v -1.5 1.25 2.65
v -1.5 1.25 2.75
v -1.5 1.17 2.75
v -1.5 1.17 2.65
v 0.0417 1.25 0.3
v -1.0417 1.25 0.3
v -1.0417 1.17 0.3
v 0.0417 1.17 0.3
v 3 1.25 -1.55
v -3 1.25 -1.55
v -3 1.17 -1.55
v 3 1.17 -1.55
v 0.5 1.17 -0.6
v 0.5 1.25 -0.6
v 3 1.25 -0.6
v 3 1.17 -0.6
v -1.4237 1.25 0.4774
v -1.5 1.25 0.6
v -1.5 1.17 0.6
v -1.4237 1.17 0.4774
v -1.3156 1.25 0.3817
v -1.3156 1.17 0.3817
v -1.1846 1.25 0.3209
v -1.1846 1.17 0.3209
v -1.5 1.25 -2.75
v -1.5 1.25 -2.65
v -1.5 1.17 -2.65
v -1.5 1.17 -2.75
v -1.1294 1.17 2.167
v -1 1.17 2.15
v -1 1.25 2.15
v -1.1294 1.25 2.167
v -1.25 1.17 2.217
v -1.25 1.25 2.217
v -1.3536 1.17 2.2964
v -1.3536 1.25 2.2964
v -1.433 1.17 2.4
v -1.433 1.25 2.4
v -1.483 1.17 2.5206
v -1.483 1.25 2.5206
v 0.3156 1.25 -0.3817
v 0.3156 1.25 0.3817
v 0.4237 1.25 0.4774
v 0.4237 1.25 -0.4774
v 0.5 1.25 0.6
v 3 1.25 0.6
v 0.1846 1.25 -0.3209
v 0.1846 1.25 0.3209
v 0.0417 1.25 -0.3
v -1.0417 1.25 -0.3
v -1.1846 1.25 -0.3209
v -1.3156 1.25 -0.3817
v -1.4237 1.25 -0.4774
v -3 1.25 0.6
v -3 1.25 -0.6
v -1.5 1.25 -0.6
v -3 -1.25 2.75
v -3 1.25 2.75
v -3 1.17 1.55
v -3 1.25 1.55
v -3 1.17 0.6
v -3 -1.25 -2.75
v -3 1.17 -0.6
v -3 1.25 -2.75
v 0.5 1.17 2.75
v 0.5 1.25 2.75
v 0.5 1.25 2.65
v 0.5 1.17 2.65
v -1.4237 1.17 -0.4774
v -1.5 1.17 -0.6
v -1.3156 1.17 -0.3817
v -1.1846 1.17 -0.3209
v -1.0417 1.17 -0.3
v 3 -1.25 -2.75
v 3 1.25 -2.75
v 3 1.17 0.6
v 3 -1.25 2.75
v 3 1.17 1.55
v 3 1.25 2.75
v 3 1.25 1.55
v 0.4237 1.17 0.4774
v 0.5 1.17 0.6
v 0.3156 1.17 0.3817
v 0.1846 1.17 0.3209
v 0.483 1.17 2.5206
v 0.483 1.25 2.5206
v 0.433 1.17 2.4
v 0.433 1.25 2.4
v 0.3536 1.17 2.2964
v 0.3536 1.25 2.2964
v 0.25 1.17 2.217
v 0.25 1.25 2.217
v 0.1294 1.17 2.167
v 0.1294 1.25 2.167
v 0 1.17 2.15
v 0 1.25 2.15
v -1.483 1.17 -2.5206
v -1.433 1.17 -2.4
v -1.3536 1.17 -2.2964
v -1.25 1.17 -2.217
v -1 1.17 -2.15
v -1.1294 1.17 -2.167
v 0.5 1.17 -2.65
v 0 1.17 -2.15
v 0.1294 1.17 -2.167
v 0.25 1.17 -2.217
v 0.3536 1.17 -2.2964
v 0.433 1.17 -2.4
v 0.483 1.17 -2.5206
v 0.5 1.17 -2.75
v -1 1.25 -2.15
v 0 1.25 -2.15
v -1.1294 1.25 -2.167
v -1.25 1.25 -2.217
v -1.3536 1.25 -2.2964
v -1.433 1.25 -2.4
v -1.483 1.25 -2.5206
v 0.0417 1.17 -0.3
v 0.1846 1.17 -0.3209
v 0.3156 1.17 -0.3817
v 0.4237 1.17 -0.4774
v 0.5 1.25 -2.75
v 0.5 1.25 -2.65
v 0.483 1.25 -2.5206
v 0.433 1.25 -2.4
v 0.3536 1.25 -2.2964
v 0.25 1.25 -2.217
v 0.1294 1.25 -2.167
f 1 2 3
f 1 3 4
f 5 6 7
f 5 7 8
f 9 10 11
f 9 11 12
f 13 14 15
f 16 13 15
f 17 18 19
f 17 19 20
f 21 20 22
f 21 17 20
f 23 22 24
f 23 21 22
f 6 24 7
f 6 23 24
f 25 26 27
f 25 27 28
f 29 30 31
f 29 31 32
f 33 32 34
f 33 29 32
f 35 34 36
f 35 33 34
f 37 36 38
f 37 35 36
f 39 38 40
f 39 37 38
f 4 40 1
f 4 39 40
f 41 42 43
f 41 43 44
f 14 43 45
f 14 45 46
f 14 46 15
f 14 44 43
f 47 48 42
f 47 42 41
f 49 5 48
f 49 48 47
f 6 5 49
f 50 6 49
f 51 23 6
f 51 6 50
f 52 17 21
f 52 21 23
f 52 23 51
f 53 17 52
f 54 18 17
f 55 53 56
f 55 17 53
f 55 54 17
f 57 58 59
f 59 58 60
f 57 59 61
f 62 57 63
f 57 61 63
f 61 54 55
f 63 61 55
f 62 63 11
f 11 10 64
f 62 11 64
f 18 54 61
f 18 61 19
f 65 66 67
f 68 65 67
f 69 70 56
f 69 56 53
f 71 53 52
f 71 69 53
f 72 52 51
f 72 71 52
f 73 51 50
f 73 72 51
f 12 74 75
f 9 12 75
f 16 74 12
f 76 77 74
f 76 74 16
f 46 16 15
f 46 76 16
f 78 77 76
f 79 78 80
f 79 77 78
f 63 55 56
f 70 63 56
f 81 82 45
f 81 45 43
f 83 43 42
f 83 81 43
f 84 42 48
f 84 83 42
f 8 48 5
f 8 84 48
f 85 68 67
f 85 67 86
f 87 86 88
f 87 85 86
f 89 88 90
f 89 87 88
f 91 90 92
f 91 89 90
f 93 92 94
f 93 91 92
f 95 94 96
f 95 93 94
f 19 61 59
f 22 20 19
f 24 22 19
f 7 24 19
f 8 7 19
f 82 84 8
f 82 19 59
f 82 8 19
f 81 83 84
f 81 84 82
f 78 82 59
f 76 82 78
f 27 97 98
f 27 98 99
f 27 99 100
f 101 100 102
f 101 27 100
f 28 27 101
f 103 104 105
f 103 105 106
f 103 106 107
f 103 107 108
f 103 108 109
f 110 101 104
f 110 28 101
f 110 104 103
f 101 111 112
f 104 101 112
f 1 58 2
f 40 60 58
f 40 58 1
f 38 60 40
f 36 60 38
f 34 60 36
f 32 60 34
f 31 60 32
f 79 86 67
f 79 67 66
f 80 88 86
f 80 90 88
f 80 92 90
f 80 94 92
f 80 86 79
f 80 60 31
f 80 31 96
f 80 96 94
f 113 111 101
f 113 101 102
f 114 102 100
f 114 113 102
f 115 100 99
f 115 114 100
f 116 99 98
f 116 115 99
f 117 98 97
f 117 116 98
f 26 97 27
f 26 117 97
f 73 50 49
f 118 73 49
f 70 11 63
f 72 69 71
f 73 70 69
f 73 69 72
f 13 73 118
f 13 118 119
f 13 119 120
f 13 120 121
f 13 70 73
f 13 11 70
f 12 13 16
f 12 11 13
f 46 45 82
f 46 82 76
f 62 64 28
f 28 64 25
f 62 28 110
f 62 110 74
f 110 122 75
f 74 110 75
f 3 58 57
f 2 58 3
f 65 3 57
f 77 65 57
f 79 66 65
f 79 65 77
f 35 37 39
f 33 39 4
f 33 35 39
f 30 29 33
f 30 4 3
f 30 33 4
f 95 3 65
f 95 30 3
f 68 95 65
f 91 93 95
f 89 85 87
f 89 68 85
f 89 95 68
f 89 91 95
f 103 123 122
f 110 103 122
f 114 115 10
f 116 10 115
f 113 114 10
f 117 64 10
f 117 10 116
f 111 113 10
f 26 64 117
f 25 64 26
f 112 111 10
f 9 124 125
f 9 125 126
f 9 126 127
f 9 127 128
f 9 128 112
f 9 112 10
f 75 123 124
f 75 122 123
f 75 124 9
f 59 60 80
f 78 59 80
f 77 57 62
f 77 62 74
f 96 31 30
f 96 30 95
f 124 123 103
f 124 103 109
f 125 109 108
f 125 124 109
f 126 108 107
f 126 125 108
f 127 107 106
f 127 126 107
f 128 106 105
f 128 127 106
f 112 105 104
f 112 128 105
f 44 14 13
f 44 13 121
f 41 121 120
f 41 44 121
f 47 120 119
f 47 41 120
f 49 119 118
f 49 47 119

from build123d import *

# Parameters (mm, degrees)
SKETCH1_W           = 6
SKETCH1_H           = 2.5
BOSS_EXTRUDE1_DEPTH = 2.75
SKETCH3_OUTSIDE_W   = 9.702
SKETCH3_OUTSIDE_H   = 9.202
SKETCH3_OUTSIDE_W_2 = 4
SKETCH3_OUTSIDE_H_2 = 0.6
CUT_EXTRUDE1_DEPTH  = 0.08
SKETCH7_W           = 1.5
SKETCH7_H           = 1.2
SKETCH7_W_2         = 2.5
BOSS_EXTRUDE3_DEPTH = 0.2
FILLET2_R           = 0.5


with BuildPart() as part:
    # Sketch1 → Boss-Extrude1 (new, symmetric)
    with BuildSketch(Plane.XY):
        Rectangle(SKETCH1_W, SKETCH1_H)
    extrude(amount=BOSS_EXTRUDE1_DEPTH, both=True)

    # Sketch3 outside → Cut-Extrude1 (cut)
    with BuildSketch(Plane(origin=(0, 1.25, 0), x_dir=(1, 0, 0), z_dir=(0, 1, 0))):
        Rectangle(SKETCH3_OUTSIDE_W, SKETCH3_OUTSIDE_H)
        with Locations((0, 1.85)):
            Rectangle(SKETCH3_OUTSIDE_W_2, SKETCH3_OUTSIDE_H_2, mode=Mode.SUBTRACT)
        with Locations((0, -1.85)):
            Rectangle(SKETCH3_OUTSIDE_W_2, SKETCH3_OUTSIDE_H_2, mode=Mode.SUBTRACT)
        Rectangle(SKETCH3_OUTSIDE_W_2, SKETCH3_OUTSIDE_H_2, mode=Mode.SUBTRACT)
    extrude(amount=-CUT_EXTRUDE1_DEPTH, mode=Mode.SUBTRACT)

    # Sketch7 → Boss-Extrude3 (add)
    with BuildSketch(Plane(origin=(0, 1.25, 0), x_dir=(1, 0, 0), z_dir=(0, 1, 0))):
        with Locations((-2.25, 2.15)):
            Rectangle(SKETCH7_W, SKETCH7_H)
        with Locations((-2.25, -2.15)):
            Rectangle(SKETCH7_W, SKETCH7_H)
        with Locations((1.75, 2.15)):
            Rectangle(SKETCH7_W_2, SKETCH7_H)
        with Locations((1.75, -2.15)):
            Rectangle(SKETCH7_W_2, SKETCH7_H)
        with Locations((-2.25, 0)):
            Rectangle(SKETCH7_W, SKETCH7_H)
        with Locations((1.75, 0)):
            Rectangle(SKETCH7_W_2, SKETCH7_H)
    extrude(amount=-BOSS_EXTRUDE3_DEPTH)

    # Fillet2
    # the kernel refuses this fillet: 0.5 mm, written as the material it adds along each edge
    with BuildSketch(Plane(origin=(0.5, 1.25, -2.15), x_dir=(-1, 0, 0), z_dir=(0, -1, 0)), Plane(origin=(0.5, -0.08, 2.15), x_dir=(-1, 0, 0), z_dir=(0, 1, 0)), Plane(origin=(-1.5, 1.25, -2.15), x_dir=(0, 0, -1), z_dir=(0, -1, 0)), Plane(origin=(-1.5, -0.08, 2.15), x_dir=(0, 0, 1), z_dir=(0, 1, 0))) as fillet2_piece_1:
        with BuildLine():
            CenterArc((FILLET2_R, FILLET2_R), FILLET2_R, 180, 90)
            Line((0, FILLET2_R), (-FILLET2_R * 0.02, FILLET2_R))
            Line((-FILLET2_R * 0.02, FILLET2_R), (-FILLET2_R * 0.02, -FILLET2_R * 0.02))
            Line((-FILLET2_R * 0.02, -FILLET2_R * 0.02), (FILLET2_R, -FILLET2_R * 0.02))
            Line((FILLET2_R, -FILLET2_R * 0.02), (FILLET2_R, 0))
        make_face()
    extrude(amount=1.33)
    with BuildSketch(Plane(origin=(-1.5, 0.024356076, -0.3), x_dir=(1, 0, 0), z_dir=(0, 1, 0)), Plane(origin=(0.5, 0.024356076, 0.3), x_dir=(-1, 0, 0), z_dir=(0, 1, 0))) as fillet2_piece_2:
        with BuildLine():
            CenterArc((0.458257569, 0.5), FILLET2_R, 203.578178478, 66.421821522)
            Line((0, 0.3), (-0.009165151, 0.296))
            ThreePointArc((-0.009165151, 0.296), (-0.01, 0.15), (-0.01, 0))
            Line((-0.01, 0), (0, -0.01))
            Line((0, -0.01), (0.458257569, -0.01))
            Line((0.458257569, -0.01), (0.458257569, 0))
        make_face()
    extrude(amount=1.225643924)
    with BuildSketch(Plane(origin=(-1.5, 1.25, 0.3), x_dir=(0, 0, 1), z_dir=(0, -1, 0)), Plane(origin=(0.5, 1.25, -0.3), x_dir=(0, 0, -1), z_dir=(0, -1, 0))) as fillet2_piece_3:
        with BuildLine():
            CenterArc((0.5, -0.458257569), FILLET2_R, 113.578178478, 66.421821522)
            Line((0, -0.458257569), (-0.01, -0.458257569))
            Line((-0.01, -0.458257569), (-0.01, 0))
            Line((-0.01, 0), (0, 0.01))
            ThreePointArc((0, 0.01), (0.15, 0.01), (0.296, 0.009165151))
            Line((0.296, 0.009165151), (0.3, 0))
        make_face()
    extrude(amount=1.225643924)


solid = part.part
